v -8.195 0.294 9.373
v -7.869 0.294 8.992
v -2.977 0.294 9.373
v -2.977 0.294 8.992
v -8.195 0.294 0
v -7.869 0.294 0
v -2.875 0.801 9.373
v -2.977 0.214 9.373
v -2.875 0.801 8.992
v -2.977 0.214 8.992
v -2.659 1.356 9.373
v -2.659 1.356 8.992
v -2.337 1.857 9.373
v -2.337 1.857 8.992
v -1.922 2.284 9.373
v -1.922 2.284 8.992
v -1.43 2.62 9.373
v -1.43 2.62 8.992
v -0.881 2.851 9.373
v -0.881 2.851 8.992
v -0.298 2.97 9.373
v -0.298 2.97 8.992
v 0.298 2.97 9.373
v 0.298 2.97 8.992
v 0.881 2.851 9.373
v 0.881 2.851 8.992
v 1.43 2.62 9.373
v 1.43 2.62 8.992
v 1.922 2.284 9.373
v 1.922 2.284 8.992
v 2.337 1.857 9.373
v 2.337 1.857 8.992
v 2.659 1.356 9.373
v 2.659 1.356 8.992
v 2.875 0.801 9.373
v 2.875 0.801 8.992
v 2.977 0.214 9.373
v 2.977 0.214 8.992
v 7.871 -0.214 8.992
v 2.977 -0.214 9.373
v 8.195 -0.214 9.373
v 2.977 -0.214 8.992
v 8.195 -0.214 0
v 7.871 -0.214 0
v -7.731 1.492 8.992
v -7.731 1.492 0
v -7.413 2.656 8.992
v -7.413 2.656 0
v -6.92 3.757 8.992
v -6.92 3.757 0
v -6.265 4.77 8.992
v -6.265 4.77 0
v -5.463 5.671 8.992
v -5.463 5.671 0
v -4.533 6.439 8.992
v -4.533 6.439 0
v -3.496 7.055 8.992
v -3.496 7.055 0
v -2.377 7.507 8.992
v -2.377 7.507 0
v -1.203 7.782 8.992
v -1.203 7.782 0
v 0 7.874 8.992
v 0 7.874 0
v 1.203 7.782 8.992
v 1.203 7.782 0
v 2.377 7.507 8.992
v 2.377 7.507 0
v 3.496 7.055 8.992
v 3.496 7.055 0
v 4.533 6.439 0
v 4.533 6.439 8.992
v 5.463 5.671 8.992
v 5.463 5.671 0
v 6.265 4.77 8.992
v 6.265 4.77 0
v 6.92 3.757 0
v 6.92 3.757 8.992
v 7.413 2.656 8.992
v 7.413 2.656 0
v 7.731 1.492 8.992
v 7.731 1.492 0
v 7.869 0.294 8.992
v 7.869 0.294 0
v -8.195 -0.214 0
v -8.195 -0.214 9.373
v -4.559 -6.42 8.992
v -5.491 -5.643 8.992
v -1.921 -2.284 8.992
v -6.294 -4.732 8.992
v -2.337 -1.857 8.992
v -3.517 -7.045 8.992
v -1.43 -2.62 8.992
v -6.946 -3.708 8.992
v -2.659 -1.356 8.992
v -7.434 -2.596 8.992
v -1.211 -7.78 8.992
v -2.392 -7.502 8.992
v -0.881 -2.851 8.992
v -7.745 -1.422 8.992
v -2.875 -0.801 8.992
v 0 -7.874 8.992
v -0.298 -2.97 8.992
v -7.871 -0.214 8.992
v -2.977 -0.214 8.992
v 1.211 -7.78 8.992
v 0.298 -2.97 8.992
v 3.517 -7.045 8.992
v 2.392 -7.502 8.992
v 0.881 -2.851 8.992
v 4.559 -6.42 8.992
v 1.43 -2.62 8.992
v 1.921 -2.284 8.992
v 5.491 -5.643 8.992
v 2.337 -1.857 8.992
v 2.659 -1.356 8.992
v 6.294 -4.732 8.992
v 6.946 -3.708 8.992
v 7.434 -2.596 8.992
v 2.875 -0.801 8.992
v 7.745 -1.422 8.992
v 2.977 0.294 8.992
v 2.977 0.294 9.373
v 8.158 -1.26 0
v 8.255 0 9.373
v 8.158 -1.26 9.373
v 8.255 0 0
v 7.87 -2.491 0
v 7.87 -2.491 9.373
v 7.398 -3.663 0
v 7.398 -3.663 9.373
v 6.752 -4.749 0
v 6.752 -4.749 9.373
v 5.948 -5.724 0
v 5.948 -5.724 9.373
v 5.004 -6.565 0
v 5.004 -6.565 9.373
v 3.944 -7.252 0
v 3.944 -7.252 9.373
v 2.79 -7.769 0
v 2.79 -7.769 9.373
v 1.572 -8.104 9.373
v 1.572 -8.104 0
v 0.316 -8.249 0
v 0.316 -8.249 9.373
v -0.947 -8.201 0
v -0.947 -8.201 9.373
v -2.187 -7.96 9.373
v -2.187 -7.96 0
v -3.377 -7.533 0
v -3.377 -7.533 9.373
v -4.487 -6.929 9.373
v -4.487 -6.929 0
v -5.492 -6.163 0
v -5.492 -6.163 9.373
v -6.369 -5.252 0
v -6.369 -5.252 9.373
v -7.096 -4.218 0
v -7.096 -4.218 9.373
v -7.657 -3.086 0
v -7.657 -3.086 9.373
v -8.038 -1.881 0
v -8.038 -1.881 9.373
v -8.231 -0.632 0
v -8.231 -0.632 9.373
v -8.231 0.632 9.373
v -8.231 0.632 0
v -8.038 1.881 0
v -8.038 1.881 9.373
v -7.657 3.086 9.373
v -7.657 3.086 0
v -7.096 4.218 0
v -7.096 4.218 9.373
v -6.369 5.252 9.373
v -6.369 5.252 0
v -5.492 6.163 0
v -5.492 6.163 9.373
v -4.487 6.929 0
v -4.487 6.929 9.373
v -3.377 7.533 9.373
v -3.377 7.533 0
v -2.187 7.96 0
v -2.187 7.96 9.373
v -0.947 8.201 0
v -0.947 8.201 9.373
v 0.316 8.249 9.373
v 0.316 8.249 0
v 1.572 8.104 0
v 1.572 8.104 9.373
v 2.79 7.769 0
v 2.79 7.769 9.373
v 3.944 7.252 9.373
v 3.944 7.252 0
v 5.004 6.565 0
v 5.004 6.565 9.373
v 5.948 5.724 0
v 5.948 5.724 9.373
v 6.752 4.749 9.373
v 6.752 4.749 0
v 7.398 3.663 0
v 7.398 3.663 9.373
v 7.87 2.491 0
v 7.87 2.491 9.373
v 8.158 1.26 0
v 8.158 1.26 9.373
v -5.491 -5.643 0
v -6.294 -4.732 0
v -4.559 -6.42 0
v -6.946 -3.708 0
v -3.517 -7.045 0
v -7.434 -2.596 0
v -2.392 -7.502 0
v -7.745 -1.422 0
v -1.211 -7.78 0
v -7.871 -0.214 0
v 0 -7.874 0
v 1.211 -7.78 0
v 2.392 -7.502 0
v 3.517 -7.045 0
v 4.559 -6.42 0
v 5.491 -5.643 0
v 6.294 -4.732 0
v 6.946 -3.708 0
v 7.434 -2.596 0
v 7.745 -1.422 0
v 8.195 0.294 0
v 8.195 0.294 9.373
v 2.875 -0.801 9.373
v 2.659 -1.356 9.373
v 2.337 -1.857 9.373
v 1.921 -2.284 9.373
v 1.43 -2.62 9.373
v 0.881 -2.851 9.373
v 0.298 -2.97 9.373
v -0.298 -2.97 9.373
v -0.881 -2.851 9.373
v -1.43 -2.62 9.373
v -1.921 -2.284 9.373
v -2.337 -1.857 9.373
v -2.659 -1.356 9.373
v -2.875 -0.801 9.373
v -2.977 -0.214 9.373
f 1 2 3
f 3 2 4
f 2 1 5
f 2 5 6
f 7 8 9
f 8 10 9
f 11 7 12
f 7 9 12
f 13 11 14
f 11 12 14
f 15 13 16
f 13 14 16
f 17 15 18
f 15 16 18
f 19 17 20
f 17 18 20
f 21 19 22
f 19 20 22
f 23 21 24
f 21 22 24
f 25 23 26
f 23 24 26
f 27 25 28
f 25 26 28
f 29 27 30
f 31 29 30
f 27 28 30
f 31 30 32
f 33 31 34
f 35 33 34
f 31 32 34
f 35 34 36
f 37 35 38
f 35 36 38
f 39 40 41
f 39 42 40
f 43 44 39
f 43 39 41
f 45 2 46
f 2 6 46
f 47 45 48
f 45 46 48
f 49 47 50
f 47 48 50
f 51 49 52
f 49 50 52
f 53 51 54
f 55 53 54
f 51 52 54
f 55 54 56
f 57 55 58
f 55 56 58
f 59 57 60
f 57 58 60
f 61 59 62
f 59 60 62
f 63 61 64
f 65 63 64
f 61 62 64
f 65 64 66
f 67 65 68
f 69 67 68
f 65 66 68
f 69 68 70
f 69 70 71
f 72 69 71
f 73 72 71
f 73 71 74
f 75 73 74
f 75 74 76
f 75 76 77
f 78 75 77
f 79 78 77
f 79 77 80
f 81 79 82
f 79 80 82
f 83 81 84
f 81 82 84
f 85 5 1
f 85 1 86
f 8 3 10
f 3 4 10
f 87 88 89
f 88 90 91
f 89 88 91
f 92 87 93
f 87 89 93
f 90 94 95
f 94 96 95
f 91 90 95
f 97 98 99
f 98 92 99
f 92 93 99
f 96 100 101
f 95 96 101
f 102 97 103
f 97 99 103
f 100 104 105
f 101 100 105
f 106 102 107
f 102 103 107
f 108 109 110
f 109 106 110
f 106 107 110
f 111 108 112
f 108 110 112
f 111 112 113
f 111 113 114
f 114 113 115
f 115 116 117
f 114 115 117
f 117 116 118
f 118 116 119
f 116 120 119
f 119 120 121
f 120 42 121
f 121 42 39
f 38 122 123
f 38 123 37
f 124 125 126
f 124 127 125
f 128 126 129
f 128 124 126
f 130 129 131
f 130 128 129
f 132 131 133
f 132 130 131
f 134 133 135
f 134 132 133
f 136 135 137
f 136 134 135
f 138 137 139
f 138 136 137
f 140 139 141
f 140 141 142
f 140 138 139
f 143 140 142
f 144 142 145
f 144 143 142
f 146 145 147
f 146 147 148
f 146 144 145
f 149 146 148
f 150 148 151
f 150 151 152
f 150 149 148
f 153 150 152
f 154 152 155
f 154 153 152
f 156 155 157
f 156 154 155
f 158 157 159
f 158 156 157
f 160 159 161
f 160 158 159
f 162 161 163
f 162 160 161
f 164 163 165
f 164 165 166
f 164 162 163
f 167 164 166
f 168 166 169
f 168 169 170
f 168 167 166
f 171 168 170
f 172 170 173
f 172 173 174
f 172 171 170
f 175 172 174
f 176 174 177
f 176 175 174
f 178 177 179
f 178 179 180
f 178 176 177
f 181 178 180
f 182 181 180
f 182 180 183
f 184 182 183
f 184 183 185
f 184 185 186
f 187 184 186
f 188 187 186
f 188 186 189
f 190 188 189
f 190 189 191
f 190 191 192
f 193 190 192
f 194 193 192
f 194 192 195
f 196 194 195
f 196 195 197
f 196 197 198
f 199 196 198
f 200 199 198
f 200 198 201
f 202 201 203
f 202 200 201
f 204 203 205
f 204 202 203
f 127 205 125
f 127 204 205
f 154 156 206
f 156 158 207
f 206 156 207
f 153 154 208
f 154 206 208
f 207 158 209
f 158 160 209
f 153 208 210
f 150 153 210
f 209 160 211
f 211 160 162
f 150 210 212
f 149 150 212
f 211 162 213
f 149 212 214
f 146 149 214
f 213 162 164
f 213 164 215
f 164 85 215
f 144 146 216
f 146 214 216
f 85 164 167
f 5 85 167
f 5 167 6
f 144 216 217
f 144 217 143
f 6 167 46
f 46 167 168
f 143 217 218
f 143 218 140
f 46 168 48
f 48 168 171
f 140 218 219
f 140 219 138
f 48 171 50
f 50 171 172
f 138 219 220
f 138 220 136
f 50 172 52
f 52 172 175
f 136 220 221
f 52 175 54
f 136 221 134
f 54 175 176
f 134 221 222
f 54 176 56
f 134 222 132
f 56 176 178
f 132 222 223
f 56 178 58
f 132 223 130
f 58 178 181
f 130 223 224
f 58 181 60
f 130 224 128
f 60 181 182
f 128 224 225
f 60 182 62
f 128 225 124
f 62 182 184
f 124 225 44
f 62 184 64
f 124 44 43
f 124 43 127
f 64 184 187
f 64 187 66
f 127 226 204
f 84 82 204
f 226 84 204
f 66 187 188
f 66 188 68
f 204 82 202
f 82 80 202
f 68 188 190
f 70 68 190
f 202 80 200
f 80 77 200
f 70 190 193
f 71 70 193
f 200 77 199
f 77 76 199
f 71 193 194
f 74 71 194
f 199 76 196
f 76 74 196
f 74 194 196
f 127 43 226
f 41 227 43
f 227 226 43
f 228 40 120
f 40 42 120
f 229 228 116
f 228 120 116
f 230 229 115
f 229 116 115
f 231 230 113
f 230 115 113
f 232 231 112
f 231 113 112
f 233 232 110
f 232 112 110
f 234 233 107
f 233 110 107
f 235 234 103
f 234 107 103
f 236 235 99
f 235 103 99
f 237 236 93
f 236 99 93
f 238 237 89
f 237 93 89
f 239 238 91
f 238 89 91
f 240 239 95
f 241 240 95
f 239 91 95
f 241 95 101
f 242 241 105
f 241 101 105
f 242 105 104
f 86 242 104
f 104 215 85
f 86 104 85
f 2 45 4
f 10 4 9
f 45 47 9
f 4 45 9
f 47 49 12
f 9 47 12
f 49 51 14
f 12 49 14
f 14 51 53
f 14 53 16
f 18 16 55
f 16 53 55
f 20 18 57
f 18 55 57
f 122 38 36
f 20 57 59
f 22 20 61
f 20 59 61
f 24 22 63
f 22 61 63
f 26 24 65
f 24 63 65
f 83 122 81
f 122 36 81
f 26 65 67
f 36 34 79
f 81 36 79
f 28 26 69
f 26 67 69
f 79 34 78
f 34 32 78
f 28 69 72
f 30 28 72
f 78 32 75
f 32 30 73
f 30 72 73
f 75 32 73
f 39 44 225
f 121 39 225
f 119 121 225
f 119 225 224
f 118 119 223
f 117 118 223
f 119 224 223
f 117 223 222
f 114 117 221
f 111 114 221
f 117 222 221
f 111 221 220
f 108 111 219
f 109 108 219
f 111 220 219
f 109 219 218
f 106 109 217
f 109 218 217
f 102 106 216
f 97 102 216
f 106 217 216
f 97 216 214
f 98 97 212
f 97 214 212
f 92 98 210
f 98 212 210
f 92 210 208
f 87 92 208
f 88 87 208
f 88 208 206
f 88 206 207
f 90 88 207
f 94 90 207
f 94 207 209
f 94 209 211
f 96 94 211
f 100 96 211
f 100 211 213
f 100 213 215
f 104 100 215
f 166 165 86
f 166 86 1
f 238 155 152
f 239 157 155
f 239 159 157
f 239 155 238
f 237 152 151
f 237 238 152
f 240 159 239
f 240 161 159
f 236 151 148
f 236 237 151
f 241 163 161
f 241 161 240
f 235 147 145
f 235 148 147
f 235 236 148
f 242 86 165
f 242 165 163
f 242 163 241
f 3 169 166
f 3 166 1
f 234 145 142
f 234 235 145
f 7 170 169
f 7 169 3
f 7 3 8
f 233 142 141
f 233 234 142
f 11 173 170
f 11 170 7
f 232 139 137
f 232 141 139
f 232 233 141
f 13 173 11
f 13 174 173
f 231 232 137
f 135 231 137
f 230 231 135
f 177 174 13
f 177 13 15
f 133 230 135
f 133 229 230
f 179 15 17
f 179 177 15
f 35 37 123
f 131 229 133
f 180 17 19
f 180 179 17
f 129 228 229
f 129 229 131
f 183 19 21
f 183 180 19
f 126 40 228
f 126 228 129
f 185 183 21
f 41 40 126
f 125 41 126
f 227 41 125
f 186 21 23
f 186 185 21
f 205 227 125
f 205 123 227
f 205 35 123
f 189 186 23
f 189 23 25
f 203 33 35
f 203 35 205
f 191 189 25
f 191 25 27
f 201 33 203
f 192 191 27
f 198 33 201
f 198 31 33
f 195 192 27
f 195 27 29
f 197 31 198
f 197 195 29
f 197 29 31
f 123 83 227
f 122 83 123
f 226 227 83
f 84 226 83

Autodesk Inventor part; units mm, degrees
ref_plane "YZ Plane" through (0, 0, 0) normal (1, 0, 0) x (0, 1, 0)
ref_plane "XZ Plane" through (0, 0, 0) normal (0, 1, 0) x (-1, 0, 0)
ref_plane "XY Plane" through (0, 0, 0) normal (0, 0, 1) x (1, 0, 0)
sketch "Sketch1" plane through (0, 0, 0) normal (0, 0, 1) x (1, 0, 0)
  circle A0 centre (0, 0) radius 8.255
  circle A1 centre (0, 0) radius 2.9845
  line L0 (-8.2498, 0.2936) -> (-2.9768, 0.2936)
  line L1 (-2.9768, 0.2936) -> (-2.9768, -0.2144)
  line L2 (-2.9768, -0.2144) -> (-8.2498, -0.2144)
  line L3 (-8.1951, 0.2936) -> (-8.1951, -0.2144)
  line L4 (0, 8.255) -> (0, -8.255) construction
  line L5 (8.2498, 0.2936) -> (2.9768, 0.2936)
  line L6 (2.9768, 0.2936) -> (2.9768, -0.2144)
  line L7 (2.9768, -0.2144) -> (8.2498, -0.2144)
  line L8 (8.1951, 0.2936) -> (8.1951, -0.2144)
  dimension "d13" = 5.969
  dimension "d0" = 16.51
  dimension "d14" = 0.508
extrude "Extrusion1" add sketch "Sketch1" along normal blind 9.3726
shell "Shell1" thickness 0.381 removed faces 1 at (-0.9758, 3.8899, 0)
extrude "Extrusion3" cut sketch "Sketch1" along normal blind 17.526 contours L0 L1 A1 L2 L3 | L1 A1
extrude "Extrusion4" cut sketch "Sketch1" along normal blind 17.526 contours L6 A1 L1 | A1 L6 | L1 A1
extrude "Extrusion5" cut sketch "Sketch1" along normal blind 17.526 contours L8 L7 A1 L6 L5 | A1 L6
sketch "Sketch2" plane through (0, 0, 9.3726) normal (0, 0, 1) x (1, 0, 0)
  circle A0 centre (0, 0) radius 8.255 projected
  line L0 (0, 8.255) -> (0, -8.255)
  line L1 (8.1951, -0.2144) -> (2.9768, -0.2144) projected
  line L2 (8.1951, -0.2144) -> (-8.3257, -0.2144)
properties part number "dis1"
